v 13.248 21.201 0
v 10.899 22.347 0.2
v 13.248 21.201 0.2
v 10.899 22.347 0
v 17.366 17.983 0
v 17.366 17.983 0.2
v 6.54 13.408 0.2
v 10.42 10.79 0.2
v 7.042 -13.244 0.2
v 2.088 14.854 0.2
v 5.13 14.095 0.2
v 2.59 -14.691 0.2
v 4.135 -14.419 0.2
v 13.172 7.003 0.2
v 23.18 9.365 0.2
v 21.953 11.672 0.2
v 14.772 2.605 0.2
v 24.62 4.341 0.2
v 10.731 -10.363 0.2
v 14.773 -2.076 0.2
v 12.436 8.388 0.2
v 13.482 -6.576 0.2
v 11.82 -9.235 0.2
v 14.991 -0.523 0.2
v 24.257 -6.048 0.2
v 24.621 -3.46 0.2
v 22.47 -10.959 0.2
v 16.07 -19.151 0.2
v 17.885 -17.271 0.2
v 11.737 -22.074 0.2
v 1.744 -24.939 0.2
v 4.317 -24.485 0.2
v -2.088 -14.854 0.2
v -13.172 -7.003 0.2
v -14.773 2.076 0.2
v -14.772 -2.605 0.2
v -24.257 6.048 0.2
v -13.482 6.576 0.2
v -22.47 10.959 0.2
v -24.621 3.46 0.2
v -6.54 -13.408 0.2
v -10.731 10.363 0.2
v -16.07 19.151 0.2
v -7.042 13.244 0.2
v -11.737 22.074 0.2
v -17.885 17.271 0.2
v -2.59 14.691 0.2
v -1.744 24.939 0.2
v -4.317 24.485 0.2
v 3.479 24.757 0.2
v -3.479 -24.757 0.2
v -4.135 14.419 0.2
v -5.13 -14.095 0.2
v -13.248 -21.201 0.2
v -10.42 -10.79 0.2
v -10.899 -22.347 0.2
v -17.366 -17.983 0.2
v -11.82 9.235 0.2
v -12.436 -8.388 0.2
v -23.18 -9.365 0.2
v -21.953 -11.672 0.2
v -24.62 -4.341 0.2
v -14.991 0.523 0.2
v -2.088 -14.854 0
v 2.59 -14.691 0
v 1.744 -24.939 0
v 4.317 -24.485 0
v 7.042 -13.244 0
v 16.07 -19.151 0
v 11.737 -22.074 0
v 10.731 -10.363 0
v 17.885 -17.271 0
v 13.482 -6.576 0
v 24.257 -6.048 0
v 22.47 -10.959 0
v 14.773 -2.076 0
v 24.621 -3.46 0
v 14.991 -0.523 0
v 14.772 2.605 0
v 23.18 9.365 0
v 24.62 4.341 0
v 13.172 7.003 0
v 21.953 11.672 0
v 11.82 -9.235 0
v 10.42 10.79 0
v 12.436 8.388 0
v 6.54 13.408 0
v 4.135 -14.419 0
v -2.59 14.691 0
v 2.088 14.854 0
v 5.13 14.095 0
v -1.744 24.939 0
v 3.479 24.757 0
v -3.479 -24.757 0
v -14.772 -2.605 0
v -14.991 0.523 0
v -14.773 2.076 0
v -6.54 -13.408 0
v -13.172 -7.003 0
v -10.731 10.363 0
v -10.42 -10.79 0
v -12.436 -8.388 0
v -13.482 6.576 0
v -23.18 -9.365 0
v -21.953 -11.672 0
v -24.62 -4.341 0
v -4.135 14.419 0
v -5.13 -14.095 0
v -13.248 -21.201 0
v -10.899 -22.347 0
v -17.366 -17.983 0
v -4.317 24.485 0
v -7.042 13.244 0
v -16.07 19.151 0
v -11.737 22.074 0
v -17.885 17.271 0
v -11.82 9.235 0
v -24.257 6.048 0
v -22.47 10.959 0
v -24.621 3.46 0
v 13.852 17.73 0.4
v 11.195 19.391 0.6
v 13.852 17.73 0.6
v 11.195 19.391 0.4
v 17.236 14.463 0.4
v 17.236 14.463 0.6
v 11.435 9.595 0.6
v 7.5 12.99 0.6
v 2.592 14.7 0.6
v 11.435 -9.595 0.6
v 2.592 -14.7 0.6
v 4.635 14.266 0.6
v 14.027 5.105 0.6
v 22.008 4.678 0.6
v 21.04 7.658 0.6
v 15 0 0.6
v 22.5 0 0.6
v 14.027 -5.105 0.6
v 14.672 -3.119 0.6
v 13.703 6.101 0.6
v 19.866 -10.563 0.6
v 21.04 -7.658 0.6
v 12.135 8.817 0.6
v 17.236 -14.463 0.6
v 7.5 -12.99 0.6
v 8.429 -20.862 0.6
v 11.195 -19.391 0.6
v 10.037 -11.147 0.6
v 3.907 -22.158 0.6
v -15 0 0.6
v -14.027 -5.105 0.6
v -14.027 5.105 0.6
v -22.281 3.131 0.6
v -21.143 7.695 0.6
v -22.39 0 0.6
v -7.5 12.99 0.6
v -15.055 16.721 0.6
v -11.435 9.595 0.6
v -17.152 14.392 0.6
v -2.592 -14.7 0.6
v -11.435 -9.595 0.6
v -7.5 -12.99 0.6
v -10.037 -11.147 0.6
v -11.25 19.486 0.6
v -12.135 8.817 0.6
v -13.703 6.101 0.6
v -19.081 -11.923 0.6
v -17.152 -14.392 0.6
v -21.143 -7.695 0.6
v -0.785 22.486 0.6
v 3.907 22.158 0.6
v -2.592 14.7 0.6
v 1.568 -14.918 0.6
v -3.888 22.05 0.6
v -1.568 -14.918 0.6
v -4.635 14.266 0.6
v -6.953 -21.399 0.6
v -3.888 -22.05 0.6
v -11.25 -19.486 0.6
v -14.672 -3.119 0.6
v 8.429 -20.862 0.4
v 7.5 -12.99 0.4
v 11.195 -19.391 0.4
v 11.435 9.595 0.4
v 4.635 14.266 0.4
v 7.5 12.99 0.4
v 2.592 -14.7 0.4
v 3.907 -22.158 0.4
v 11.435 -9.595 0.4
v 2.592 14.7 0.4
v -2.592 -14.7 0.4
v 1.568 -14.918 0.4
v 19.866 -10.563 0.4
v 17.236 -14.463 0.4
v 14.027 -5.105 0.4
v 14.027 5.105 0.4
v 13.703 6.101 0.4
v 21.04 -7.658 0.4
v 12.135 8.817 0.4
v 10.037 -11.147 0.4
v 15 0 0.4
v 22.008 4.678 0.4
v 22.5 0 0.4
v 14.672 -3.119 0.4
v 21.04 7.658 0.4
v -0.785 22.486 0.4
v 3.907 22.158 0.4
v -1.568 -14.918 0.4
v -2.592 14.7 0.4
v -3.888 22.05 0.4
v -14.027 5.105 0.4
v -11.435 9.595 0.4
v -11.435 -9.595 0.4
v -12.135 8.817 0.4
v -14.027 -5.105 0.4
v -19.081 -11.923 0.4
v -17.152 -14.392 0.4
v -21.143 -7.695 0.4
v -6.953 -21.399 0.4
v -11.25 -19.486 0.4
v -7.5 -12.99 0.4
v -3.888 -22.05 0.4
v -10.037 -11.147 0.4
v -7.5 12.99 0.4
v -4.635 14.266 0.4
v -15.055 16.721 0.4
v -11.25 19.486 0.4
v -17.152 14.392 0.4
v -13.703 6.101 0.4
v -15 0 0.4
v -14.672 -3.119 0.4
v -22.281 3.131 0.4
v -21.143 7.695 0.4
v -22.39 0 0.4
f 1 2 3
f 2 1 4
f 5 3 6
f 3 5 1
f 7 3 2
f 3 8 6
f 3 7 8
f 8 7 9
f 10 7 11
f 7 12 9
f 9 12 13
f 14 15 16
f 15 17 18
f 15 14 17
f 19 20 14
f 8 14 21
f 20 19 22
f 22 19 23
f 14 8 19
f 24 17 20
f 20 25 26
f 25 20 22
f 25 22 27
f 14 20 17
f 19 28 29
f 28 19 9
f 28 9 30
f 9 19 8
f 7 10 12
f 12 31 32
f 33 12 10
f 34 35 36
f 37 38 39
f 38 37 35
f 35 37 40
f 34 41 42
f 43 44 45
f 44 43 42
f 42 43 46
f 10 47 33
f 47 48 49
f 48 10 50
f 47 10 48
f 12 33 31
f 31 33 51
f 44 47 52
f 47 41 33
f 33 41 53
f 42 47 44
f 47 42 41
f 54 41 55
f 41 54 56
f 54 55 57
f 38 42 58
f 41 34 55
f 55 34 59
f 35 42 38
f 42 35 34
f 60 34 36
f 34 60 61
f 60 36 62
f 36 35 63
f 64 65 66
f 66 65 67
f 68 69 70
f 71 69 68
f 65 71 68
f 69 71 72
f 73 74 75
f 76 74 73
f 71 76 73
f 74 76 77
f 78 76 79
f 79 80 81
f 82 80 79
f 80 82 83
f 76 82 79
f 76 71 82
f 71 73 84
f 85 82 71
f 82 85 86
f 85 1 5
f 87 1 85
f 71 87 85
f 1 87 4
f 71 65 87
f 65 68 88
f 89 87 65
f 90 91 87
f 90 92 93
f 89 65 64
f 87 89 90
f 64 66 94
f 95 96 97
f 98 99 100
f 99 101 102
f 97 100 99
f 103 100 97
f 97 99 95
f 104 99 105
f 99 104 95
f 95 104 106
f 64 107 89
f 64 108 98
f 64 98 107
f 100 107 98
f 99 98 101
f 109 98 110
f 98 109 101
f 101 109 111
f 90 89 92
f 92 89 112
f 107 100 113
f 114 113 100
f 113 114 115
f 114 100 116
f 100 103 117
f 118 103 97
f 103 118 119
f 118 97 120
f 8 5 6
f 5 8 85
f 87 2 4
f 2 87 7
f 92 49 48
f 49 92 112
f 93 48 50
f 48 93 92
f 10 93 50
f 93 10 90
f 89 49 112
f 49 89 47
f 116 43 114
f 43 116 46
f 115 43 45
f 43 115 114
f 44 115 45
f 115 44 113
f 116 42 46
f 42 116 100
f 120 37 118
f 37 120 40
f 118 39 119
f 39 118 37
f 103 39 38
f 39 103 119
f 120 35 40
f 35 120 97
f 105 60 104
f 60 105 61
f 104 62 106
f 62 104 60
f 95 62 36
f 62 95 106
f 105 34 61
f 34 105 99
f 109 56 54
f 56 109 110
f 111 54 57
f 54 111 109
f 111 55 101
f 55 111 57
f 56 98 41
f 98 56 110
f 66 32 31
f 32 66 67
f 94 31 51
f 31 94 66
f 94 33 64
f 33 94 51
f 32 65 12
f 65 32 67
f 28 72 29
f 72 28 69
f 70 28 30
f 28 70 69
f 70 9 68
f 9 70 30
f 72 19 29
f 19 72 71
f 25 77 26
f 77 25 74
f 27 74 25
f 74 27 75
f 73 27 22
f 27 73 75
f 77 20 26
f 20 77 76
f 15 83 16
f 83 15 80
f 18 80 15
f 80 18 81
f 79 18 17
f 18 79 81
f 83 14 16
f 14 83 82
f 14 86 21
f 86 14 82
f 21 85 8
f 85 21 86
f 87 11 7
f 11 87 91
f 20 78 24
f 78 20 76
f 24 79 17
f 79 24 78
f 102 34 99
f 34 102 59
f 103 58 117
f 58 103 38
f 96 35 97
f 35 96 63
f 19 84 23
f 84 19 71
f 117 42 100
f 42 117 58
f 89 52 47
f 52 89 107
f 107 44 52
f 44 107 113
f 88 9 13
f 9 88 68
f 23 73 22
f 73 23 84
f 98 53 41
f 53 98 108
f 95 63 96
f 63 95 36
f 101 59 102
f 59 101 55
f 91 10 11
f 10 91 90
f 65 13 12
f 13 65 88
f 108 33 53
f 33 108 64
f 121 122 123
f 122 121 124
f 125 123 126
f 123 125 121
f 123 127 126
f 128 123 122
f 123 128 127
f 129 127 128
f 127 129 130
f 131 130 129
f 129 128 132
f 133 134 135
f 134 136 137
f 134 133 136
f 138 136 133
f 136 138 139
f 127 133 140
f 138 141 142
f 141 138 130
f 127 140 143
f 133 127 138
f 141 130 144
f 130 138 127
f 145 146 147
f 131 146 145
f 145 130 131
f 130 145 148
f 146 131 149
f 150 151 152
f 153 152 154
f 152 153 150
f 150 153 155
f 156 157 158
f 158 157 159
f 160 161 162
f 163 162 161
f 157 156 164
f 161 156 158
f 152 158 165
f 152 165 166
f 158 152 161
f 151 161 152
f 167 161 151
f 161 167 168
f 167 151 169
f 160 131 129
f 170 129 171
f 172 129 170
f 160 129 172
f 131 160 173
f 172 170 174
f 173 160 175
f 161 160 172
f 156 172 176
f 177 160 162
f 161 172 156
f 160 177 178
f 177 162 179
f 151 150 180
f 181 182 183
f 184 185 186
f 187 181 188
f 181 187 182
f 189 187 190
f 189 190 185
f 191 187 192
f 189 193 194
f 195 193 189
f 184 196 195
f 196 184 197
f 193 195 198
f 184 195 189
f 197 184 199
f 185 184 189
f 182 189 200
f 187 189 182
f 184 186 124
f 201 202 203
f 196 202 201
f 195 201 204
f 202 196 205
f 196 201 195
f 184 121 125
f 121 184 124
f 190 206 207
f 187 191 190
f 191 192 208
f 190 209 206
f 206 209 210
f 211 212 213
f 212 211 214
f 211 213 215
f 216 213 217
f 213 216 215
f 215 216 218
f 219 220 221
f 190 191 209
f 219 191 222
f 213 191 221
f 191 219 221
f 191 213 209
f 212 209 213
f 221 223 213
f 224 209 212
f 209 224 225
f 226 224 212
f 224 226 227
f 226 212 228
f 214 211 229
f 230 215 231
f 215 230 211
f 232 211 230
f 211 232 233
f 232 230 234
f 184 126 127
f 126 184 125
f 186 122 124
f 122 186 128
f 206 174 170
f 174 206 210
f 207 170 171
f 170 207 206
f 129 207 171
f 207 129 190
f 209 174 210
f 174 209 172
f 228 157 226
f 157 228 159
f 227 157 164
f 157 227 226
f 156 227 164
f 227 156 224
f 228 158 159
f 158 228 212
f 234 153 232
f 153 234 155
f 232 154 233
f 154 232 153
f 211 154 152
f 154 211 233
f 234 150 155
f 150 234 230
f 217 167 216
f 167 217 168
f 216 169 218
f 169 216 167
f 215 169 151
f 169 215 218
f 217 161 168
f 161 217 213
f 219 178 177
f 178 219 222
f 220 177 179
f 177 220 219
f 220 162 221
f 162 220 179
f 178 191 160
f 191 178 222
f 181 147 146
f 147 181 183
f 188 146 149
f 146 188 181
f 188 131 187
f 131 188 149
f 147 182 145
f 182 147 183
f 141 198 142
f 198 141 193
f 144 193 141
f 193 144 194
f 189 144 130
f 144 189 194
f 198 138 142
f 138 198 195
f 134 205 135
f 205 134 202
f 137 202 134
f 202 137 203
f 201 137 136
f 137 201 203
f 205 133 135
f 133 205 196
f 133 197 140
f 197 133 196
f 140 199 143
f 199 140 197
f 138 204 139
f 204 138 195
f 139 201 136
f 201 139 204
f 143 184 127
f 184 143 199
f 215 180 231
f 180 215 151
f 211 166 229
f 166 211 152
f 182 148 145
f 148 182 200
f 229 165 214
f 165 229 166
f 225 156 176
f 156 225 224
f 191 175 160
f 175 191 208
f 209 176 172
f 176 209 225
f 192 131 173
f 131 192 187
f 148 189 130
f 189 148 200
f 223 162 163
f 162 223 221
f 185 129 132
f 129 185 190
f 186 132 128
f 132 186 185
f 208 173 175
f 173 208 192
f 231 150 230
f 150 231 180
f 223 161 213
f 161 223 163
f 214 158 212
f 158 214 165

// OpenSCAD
module wheel(di=30,do=50,h=0.2,n){
cylinder(r=di/2,h=h);
for (i=[1:n])rotate(i/n*360)intersection(){
   cylinder(r=do/2,h=h);
    translate([-1.5*do,0,-0.25*h])cube([3*do,1.5*do,2*h]);   rotate(180+1/(2*n)*360)translate([-1.5*do,0,-0.25*h])cube([3*do,1.5*do,2*h]);}//intersection
}//module
rotate(10
)color("black")wheel(n=10);
translate([0,0,0.4])color("blue")wheel(do=45,n=9);
